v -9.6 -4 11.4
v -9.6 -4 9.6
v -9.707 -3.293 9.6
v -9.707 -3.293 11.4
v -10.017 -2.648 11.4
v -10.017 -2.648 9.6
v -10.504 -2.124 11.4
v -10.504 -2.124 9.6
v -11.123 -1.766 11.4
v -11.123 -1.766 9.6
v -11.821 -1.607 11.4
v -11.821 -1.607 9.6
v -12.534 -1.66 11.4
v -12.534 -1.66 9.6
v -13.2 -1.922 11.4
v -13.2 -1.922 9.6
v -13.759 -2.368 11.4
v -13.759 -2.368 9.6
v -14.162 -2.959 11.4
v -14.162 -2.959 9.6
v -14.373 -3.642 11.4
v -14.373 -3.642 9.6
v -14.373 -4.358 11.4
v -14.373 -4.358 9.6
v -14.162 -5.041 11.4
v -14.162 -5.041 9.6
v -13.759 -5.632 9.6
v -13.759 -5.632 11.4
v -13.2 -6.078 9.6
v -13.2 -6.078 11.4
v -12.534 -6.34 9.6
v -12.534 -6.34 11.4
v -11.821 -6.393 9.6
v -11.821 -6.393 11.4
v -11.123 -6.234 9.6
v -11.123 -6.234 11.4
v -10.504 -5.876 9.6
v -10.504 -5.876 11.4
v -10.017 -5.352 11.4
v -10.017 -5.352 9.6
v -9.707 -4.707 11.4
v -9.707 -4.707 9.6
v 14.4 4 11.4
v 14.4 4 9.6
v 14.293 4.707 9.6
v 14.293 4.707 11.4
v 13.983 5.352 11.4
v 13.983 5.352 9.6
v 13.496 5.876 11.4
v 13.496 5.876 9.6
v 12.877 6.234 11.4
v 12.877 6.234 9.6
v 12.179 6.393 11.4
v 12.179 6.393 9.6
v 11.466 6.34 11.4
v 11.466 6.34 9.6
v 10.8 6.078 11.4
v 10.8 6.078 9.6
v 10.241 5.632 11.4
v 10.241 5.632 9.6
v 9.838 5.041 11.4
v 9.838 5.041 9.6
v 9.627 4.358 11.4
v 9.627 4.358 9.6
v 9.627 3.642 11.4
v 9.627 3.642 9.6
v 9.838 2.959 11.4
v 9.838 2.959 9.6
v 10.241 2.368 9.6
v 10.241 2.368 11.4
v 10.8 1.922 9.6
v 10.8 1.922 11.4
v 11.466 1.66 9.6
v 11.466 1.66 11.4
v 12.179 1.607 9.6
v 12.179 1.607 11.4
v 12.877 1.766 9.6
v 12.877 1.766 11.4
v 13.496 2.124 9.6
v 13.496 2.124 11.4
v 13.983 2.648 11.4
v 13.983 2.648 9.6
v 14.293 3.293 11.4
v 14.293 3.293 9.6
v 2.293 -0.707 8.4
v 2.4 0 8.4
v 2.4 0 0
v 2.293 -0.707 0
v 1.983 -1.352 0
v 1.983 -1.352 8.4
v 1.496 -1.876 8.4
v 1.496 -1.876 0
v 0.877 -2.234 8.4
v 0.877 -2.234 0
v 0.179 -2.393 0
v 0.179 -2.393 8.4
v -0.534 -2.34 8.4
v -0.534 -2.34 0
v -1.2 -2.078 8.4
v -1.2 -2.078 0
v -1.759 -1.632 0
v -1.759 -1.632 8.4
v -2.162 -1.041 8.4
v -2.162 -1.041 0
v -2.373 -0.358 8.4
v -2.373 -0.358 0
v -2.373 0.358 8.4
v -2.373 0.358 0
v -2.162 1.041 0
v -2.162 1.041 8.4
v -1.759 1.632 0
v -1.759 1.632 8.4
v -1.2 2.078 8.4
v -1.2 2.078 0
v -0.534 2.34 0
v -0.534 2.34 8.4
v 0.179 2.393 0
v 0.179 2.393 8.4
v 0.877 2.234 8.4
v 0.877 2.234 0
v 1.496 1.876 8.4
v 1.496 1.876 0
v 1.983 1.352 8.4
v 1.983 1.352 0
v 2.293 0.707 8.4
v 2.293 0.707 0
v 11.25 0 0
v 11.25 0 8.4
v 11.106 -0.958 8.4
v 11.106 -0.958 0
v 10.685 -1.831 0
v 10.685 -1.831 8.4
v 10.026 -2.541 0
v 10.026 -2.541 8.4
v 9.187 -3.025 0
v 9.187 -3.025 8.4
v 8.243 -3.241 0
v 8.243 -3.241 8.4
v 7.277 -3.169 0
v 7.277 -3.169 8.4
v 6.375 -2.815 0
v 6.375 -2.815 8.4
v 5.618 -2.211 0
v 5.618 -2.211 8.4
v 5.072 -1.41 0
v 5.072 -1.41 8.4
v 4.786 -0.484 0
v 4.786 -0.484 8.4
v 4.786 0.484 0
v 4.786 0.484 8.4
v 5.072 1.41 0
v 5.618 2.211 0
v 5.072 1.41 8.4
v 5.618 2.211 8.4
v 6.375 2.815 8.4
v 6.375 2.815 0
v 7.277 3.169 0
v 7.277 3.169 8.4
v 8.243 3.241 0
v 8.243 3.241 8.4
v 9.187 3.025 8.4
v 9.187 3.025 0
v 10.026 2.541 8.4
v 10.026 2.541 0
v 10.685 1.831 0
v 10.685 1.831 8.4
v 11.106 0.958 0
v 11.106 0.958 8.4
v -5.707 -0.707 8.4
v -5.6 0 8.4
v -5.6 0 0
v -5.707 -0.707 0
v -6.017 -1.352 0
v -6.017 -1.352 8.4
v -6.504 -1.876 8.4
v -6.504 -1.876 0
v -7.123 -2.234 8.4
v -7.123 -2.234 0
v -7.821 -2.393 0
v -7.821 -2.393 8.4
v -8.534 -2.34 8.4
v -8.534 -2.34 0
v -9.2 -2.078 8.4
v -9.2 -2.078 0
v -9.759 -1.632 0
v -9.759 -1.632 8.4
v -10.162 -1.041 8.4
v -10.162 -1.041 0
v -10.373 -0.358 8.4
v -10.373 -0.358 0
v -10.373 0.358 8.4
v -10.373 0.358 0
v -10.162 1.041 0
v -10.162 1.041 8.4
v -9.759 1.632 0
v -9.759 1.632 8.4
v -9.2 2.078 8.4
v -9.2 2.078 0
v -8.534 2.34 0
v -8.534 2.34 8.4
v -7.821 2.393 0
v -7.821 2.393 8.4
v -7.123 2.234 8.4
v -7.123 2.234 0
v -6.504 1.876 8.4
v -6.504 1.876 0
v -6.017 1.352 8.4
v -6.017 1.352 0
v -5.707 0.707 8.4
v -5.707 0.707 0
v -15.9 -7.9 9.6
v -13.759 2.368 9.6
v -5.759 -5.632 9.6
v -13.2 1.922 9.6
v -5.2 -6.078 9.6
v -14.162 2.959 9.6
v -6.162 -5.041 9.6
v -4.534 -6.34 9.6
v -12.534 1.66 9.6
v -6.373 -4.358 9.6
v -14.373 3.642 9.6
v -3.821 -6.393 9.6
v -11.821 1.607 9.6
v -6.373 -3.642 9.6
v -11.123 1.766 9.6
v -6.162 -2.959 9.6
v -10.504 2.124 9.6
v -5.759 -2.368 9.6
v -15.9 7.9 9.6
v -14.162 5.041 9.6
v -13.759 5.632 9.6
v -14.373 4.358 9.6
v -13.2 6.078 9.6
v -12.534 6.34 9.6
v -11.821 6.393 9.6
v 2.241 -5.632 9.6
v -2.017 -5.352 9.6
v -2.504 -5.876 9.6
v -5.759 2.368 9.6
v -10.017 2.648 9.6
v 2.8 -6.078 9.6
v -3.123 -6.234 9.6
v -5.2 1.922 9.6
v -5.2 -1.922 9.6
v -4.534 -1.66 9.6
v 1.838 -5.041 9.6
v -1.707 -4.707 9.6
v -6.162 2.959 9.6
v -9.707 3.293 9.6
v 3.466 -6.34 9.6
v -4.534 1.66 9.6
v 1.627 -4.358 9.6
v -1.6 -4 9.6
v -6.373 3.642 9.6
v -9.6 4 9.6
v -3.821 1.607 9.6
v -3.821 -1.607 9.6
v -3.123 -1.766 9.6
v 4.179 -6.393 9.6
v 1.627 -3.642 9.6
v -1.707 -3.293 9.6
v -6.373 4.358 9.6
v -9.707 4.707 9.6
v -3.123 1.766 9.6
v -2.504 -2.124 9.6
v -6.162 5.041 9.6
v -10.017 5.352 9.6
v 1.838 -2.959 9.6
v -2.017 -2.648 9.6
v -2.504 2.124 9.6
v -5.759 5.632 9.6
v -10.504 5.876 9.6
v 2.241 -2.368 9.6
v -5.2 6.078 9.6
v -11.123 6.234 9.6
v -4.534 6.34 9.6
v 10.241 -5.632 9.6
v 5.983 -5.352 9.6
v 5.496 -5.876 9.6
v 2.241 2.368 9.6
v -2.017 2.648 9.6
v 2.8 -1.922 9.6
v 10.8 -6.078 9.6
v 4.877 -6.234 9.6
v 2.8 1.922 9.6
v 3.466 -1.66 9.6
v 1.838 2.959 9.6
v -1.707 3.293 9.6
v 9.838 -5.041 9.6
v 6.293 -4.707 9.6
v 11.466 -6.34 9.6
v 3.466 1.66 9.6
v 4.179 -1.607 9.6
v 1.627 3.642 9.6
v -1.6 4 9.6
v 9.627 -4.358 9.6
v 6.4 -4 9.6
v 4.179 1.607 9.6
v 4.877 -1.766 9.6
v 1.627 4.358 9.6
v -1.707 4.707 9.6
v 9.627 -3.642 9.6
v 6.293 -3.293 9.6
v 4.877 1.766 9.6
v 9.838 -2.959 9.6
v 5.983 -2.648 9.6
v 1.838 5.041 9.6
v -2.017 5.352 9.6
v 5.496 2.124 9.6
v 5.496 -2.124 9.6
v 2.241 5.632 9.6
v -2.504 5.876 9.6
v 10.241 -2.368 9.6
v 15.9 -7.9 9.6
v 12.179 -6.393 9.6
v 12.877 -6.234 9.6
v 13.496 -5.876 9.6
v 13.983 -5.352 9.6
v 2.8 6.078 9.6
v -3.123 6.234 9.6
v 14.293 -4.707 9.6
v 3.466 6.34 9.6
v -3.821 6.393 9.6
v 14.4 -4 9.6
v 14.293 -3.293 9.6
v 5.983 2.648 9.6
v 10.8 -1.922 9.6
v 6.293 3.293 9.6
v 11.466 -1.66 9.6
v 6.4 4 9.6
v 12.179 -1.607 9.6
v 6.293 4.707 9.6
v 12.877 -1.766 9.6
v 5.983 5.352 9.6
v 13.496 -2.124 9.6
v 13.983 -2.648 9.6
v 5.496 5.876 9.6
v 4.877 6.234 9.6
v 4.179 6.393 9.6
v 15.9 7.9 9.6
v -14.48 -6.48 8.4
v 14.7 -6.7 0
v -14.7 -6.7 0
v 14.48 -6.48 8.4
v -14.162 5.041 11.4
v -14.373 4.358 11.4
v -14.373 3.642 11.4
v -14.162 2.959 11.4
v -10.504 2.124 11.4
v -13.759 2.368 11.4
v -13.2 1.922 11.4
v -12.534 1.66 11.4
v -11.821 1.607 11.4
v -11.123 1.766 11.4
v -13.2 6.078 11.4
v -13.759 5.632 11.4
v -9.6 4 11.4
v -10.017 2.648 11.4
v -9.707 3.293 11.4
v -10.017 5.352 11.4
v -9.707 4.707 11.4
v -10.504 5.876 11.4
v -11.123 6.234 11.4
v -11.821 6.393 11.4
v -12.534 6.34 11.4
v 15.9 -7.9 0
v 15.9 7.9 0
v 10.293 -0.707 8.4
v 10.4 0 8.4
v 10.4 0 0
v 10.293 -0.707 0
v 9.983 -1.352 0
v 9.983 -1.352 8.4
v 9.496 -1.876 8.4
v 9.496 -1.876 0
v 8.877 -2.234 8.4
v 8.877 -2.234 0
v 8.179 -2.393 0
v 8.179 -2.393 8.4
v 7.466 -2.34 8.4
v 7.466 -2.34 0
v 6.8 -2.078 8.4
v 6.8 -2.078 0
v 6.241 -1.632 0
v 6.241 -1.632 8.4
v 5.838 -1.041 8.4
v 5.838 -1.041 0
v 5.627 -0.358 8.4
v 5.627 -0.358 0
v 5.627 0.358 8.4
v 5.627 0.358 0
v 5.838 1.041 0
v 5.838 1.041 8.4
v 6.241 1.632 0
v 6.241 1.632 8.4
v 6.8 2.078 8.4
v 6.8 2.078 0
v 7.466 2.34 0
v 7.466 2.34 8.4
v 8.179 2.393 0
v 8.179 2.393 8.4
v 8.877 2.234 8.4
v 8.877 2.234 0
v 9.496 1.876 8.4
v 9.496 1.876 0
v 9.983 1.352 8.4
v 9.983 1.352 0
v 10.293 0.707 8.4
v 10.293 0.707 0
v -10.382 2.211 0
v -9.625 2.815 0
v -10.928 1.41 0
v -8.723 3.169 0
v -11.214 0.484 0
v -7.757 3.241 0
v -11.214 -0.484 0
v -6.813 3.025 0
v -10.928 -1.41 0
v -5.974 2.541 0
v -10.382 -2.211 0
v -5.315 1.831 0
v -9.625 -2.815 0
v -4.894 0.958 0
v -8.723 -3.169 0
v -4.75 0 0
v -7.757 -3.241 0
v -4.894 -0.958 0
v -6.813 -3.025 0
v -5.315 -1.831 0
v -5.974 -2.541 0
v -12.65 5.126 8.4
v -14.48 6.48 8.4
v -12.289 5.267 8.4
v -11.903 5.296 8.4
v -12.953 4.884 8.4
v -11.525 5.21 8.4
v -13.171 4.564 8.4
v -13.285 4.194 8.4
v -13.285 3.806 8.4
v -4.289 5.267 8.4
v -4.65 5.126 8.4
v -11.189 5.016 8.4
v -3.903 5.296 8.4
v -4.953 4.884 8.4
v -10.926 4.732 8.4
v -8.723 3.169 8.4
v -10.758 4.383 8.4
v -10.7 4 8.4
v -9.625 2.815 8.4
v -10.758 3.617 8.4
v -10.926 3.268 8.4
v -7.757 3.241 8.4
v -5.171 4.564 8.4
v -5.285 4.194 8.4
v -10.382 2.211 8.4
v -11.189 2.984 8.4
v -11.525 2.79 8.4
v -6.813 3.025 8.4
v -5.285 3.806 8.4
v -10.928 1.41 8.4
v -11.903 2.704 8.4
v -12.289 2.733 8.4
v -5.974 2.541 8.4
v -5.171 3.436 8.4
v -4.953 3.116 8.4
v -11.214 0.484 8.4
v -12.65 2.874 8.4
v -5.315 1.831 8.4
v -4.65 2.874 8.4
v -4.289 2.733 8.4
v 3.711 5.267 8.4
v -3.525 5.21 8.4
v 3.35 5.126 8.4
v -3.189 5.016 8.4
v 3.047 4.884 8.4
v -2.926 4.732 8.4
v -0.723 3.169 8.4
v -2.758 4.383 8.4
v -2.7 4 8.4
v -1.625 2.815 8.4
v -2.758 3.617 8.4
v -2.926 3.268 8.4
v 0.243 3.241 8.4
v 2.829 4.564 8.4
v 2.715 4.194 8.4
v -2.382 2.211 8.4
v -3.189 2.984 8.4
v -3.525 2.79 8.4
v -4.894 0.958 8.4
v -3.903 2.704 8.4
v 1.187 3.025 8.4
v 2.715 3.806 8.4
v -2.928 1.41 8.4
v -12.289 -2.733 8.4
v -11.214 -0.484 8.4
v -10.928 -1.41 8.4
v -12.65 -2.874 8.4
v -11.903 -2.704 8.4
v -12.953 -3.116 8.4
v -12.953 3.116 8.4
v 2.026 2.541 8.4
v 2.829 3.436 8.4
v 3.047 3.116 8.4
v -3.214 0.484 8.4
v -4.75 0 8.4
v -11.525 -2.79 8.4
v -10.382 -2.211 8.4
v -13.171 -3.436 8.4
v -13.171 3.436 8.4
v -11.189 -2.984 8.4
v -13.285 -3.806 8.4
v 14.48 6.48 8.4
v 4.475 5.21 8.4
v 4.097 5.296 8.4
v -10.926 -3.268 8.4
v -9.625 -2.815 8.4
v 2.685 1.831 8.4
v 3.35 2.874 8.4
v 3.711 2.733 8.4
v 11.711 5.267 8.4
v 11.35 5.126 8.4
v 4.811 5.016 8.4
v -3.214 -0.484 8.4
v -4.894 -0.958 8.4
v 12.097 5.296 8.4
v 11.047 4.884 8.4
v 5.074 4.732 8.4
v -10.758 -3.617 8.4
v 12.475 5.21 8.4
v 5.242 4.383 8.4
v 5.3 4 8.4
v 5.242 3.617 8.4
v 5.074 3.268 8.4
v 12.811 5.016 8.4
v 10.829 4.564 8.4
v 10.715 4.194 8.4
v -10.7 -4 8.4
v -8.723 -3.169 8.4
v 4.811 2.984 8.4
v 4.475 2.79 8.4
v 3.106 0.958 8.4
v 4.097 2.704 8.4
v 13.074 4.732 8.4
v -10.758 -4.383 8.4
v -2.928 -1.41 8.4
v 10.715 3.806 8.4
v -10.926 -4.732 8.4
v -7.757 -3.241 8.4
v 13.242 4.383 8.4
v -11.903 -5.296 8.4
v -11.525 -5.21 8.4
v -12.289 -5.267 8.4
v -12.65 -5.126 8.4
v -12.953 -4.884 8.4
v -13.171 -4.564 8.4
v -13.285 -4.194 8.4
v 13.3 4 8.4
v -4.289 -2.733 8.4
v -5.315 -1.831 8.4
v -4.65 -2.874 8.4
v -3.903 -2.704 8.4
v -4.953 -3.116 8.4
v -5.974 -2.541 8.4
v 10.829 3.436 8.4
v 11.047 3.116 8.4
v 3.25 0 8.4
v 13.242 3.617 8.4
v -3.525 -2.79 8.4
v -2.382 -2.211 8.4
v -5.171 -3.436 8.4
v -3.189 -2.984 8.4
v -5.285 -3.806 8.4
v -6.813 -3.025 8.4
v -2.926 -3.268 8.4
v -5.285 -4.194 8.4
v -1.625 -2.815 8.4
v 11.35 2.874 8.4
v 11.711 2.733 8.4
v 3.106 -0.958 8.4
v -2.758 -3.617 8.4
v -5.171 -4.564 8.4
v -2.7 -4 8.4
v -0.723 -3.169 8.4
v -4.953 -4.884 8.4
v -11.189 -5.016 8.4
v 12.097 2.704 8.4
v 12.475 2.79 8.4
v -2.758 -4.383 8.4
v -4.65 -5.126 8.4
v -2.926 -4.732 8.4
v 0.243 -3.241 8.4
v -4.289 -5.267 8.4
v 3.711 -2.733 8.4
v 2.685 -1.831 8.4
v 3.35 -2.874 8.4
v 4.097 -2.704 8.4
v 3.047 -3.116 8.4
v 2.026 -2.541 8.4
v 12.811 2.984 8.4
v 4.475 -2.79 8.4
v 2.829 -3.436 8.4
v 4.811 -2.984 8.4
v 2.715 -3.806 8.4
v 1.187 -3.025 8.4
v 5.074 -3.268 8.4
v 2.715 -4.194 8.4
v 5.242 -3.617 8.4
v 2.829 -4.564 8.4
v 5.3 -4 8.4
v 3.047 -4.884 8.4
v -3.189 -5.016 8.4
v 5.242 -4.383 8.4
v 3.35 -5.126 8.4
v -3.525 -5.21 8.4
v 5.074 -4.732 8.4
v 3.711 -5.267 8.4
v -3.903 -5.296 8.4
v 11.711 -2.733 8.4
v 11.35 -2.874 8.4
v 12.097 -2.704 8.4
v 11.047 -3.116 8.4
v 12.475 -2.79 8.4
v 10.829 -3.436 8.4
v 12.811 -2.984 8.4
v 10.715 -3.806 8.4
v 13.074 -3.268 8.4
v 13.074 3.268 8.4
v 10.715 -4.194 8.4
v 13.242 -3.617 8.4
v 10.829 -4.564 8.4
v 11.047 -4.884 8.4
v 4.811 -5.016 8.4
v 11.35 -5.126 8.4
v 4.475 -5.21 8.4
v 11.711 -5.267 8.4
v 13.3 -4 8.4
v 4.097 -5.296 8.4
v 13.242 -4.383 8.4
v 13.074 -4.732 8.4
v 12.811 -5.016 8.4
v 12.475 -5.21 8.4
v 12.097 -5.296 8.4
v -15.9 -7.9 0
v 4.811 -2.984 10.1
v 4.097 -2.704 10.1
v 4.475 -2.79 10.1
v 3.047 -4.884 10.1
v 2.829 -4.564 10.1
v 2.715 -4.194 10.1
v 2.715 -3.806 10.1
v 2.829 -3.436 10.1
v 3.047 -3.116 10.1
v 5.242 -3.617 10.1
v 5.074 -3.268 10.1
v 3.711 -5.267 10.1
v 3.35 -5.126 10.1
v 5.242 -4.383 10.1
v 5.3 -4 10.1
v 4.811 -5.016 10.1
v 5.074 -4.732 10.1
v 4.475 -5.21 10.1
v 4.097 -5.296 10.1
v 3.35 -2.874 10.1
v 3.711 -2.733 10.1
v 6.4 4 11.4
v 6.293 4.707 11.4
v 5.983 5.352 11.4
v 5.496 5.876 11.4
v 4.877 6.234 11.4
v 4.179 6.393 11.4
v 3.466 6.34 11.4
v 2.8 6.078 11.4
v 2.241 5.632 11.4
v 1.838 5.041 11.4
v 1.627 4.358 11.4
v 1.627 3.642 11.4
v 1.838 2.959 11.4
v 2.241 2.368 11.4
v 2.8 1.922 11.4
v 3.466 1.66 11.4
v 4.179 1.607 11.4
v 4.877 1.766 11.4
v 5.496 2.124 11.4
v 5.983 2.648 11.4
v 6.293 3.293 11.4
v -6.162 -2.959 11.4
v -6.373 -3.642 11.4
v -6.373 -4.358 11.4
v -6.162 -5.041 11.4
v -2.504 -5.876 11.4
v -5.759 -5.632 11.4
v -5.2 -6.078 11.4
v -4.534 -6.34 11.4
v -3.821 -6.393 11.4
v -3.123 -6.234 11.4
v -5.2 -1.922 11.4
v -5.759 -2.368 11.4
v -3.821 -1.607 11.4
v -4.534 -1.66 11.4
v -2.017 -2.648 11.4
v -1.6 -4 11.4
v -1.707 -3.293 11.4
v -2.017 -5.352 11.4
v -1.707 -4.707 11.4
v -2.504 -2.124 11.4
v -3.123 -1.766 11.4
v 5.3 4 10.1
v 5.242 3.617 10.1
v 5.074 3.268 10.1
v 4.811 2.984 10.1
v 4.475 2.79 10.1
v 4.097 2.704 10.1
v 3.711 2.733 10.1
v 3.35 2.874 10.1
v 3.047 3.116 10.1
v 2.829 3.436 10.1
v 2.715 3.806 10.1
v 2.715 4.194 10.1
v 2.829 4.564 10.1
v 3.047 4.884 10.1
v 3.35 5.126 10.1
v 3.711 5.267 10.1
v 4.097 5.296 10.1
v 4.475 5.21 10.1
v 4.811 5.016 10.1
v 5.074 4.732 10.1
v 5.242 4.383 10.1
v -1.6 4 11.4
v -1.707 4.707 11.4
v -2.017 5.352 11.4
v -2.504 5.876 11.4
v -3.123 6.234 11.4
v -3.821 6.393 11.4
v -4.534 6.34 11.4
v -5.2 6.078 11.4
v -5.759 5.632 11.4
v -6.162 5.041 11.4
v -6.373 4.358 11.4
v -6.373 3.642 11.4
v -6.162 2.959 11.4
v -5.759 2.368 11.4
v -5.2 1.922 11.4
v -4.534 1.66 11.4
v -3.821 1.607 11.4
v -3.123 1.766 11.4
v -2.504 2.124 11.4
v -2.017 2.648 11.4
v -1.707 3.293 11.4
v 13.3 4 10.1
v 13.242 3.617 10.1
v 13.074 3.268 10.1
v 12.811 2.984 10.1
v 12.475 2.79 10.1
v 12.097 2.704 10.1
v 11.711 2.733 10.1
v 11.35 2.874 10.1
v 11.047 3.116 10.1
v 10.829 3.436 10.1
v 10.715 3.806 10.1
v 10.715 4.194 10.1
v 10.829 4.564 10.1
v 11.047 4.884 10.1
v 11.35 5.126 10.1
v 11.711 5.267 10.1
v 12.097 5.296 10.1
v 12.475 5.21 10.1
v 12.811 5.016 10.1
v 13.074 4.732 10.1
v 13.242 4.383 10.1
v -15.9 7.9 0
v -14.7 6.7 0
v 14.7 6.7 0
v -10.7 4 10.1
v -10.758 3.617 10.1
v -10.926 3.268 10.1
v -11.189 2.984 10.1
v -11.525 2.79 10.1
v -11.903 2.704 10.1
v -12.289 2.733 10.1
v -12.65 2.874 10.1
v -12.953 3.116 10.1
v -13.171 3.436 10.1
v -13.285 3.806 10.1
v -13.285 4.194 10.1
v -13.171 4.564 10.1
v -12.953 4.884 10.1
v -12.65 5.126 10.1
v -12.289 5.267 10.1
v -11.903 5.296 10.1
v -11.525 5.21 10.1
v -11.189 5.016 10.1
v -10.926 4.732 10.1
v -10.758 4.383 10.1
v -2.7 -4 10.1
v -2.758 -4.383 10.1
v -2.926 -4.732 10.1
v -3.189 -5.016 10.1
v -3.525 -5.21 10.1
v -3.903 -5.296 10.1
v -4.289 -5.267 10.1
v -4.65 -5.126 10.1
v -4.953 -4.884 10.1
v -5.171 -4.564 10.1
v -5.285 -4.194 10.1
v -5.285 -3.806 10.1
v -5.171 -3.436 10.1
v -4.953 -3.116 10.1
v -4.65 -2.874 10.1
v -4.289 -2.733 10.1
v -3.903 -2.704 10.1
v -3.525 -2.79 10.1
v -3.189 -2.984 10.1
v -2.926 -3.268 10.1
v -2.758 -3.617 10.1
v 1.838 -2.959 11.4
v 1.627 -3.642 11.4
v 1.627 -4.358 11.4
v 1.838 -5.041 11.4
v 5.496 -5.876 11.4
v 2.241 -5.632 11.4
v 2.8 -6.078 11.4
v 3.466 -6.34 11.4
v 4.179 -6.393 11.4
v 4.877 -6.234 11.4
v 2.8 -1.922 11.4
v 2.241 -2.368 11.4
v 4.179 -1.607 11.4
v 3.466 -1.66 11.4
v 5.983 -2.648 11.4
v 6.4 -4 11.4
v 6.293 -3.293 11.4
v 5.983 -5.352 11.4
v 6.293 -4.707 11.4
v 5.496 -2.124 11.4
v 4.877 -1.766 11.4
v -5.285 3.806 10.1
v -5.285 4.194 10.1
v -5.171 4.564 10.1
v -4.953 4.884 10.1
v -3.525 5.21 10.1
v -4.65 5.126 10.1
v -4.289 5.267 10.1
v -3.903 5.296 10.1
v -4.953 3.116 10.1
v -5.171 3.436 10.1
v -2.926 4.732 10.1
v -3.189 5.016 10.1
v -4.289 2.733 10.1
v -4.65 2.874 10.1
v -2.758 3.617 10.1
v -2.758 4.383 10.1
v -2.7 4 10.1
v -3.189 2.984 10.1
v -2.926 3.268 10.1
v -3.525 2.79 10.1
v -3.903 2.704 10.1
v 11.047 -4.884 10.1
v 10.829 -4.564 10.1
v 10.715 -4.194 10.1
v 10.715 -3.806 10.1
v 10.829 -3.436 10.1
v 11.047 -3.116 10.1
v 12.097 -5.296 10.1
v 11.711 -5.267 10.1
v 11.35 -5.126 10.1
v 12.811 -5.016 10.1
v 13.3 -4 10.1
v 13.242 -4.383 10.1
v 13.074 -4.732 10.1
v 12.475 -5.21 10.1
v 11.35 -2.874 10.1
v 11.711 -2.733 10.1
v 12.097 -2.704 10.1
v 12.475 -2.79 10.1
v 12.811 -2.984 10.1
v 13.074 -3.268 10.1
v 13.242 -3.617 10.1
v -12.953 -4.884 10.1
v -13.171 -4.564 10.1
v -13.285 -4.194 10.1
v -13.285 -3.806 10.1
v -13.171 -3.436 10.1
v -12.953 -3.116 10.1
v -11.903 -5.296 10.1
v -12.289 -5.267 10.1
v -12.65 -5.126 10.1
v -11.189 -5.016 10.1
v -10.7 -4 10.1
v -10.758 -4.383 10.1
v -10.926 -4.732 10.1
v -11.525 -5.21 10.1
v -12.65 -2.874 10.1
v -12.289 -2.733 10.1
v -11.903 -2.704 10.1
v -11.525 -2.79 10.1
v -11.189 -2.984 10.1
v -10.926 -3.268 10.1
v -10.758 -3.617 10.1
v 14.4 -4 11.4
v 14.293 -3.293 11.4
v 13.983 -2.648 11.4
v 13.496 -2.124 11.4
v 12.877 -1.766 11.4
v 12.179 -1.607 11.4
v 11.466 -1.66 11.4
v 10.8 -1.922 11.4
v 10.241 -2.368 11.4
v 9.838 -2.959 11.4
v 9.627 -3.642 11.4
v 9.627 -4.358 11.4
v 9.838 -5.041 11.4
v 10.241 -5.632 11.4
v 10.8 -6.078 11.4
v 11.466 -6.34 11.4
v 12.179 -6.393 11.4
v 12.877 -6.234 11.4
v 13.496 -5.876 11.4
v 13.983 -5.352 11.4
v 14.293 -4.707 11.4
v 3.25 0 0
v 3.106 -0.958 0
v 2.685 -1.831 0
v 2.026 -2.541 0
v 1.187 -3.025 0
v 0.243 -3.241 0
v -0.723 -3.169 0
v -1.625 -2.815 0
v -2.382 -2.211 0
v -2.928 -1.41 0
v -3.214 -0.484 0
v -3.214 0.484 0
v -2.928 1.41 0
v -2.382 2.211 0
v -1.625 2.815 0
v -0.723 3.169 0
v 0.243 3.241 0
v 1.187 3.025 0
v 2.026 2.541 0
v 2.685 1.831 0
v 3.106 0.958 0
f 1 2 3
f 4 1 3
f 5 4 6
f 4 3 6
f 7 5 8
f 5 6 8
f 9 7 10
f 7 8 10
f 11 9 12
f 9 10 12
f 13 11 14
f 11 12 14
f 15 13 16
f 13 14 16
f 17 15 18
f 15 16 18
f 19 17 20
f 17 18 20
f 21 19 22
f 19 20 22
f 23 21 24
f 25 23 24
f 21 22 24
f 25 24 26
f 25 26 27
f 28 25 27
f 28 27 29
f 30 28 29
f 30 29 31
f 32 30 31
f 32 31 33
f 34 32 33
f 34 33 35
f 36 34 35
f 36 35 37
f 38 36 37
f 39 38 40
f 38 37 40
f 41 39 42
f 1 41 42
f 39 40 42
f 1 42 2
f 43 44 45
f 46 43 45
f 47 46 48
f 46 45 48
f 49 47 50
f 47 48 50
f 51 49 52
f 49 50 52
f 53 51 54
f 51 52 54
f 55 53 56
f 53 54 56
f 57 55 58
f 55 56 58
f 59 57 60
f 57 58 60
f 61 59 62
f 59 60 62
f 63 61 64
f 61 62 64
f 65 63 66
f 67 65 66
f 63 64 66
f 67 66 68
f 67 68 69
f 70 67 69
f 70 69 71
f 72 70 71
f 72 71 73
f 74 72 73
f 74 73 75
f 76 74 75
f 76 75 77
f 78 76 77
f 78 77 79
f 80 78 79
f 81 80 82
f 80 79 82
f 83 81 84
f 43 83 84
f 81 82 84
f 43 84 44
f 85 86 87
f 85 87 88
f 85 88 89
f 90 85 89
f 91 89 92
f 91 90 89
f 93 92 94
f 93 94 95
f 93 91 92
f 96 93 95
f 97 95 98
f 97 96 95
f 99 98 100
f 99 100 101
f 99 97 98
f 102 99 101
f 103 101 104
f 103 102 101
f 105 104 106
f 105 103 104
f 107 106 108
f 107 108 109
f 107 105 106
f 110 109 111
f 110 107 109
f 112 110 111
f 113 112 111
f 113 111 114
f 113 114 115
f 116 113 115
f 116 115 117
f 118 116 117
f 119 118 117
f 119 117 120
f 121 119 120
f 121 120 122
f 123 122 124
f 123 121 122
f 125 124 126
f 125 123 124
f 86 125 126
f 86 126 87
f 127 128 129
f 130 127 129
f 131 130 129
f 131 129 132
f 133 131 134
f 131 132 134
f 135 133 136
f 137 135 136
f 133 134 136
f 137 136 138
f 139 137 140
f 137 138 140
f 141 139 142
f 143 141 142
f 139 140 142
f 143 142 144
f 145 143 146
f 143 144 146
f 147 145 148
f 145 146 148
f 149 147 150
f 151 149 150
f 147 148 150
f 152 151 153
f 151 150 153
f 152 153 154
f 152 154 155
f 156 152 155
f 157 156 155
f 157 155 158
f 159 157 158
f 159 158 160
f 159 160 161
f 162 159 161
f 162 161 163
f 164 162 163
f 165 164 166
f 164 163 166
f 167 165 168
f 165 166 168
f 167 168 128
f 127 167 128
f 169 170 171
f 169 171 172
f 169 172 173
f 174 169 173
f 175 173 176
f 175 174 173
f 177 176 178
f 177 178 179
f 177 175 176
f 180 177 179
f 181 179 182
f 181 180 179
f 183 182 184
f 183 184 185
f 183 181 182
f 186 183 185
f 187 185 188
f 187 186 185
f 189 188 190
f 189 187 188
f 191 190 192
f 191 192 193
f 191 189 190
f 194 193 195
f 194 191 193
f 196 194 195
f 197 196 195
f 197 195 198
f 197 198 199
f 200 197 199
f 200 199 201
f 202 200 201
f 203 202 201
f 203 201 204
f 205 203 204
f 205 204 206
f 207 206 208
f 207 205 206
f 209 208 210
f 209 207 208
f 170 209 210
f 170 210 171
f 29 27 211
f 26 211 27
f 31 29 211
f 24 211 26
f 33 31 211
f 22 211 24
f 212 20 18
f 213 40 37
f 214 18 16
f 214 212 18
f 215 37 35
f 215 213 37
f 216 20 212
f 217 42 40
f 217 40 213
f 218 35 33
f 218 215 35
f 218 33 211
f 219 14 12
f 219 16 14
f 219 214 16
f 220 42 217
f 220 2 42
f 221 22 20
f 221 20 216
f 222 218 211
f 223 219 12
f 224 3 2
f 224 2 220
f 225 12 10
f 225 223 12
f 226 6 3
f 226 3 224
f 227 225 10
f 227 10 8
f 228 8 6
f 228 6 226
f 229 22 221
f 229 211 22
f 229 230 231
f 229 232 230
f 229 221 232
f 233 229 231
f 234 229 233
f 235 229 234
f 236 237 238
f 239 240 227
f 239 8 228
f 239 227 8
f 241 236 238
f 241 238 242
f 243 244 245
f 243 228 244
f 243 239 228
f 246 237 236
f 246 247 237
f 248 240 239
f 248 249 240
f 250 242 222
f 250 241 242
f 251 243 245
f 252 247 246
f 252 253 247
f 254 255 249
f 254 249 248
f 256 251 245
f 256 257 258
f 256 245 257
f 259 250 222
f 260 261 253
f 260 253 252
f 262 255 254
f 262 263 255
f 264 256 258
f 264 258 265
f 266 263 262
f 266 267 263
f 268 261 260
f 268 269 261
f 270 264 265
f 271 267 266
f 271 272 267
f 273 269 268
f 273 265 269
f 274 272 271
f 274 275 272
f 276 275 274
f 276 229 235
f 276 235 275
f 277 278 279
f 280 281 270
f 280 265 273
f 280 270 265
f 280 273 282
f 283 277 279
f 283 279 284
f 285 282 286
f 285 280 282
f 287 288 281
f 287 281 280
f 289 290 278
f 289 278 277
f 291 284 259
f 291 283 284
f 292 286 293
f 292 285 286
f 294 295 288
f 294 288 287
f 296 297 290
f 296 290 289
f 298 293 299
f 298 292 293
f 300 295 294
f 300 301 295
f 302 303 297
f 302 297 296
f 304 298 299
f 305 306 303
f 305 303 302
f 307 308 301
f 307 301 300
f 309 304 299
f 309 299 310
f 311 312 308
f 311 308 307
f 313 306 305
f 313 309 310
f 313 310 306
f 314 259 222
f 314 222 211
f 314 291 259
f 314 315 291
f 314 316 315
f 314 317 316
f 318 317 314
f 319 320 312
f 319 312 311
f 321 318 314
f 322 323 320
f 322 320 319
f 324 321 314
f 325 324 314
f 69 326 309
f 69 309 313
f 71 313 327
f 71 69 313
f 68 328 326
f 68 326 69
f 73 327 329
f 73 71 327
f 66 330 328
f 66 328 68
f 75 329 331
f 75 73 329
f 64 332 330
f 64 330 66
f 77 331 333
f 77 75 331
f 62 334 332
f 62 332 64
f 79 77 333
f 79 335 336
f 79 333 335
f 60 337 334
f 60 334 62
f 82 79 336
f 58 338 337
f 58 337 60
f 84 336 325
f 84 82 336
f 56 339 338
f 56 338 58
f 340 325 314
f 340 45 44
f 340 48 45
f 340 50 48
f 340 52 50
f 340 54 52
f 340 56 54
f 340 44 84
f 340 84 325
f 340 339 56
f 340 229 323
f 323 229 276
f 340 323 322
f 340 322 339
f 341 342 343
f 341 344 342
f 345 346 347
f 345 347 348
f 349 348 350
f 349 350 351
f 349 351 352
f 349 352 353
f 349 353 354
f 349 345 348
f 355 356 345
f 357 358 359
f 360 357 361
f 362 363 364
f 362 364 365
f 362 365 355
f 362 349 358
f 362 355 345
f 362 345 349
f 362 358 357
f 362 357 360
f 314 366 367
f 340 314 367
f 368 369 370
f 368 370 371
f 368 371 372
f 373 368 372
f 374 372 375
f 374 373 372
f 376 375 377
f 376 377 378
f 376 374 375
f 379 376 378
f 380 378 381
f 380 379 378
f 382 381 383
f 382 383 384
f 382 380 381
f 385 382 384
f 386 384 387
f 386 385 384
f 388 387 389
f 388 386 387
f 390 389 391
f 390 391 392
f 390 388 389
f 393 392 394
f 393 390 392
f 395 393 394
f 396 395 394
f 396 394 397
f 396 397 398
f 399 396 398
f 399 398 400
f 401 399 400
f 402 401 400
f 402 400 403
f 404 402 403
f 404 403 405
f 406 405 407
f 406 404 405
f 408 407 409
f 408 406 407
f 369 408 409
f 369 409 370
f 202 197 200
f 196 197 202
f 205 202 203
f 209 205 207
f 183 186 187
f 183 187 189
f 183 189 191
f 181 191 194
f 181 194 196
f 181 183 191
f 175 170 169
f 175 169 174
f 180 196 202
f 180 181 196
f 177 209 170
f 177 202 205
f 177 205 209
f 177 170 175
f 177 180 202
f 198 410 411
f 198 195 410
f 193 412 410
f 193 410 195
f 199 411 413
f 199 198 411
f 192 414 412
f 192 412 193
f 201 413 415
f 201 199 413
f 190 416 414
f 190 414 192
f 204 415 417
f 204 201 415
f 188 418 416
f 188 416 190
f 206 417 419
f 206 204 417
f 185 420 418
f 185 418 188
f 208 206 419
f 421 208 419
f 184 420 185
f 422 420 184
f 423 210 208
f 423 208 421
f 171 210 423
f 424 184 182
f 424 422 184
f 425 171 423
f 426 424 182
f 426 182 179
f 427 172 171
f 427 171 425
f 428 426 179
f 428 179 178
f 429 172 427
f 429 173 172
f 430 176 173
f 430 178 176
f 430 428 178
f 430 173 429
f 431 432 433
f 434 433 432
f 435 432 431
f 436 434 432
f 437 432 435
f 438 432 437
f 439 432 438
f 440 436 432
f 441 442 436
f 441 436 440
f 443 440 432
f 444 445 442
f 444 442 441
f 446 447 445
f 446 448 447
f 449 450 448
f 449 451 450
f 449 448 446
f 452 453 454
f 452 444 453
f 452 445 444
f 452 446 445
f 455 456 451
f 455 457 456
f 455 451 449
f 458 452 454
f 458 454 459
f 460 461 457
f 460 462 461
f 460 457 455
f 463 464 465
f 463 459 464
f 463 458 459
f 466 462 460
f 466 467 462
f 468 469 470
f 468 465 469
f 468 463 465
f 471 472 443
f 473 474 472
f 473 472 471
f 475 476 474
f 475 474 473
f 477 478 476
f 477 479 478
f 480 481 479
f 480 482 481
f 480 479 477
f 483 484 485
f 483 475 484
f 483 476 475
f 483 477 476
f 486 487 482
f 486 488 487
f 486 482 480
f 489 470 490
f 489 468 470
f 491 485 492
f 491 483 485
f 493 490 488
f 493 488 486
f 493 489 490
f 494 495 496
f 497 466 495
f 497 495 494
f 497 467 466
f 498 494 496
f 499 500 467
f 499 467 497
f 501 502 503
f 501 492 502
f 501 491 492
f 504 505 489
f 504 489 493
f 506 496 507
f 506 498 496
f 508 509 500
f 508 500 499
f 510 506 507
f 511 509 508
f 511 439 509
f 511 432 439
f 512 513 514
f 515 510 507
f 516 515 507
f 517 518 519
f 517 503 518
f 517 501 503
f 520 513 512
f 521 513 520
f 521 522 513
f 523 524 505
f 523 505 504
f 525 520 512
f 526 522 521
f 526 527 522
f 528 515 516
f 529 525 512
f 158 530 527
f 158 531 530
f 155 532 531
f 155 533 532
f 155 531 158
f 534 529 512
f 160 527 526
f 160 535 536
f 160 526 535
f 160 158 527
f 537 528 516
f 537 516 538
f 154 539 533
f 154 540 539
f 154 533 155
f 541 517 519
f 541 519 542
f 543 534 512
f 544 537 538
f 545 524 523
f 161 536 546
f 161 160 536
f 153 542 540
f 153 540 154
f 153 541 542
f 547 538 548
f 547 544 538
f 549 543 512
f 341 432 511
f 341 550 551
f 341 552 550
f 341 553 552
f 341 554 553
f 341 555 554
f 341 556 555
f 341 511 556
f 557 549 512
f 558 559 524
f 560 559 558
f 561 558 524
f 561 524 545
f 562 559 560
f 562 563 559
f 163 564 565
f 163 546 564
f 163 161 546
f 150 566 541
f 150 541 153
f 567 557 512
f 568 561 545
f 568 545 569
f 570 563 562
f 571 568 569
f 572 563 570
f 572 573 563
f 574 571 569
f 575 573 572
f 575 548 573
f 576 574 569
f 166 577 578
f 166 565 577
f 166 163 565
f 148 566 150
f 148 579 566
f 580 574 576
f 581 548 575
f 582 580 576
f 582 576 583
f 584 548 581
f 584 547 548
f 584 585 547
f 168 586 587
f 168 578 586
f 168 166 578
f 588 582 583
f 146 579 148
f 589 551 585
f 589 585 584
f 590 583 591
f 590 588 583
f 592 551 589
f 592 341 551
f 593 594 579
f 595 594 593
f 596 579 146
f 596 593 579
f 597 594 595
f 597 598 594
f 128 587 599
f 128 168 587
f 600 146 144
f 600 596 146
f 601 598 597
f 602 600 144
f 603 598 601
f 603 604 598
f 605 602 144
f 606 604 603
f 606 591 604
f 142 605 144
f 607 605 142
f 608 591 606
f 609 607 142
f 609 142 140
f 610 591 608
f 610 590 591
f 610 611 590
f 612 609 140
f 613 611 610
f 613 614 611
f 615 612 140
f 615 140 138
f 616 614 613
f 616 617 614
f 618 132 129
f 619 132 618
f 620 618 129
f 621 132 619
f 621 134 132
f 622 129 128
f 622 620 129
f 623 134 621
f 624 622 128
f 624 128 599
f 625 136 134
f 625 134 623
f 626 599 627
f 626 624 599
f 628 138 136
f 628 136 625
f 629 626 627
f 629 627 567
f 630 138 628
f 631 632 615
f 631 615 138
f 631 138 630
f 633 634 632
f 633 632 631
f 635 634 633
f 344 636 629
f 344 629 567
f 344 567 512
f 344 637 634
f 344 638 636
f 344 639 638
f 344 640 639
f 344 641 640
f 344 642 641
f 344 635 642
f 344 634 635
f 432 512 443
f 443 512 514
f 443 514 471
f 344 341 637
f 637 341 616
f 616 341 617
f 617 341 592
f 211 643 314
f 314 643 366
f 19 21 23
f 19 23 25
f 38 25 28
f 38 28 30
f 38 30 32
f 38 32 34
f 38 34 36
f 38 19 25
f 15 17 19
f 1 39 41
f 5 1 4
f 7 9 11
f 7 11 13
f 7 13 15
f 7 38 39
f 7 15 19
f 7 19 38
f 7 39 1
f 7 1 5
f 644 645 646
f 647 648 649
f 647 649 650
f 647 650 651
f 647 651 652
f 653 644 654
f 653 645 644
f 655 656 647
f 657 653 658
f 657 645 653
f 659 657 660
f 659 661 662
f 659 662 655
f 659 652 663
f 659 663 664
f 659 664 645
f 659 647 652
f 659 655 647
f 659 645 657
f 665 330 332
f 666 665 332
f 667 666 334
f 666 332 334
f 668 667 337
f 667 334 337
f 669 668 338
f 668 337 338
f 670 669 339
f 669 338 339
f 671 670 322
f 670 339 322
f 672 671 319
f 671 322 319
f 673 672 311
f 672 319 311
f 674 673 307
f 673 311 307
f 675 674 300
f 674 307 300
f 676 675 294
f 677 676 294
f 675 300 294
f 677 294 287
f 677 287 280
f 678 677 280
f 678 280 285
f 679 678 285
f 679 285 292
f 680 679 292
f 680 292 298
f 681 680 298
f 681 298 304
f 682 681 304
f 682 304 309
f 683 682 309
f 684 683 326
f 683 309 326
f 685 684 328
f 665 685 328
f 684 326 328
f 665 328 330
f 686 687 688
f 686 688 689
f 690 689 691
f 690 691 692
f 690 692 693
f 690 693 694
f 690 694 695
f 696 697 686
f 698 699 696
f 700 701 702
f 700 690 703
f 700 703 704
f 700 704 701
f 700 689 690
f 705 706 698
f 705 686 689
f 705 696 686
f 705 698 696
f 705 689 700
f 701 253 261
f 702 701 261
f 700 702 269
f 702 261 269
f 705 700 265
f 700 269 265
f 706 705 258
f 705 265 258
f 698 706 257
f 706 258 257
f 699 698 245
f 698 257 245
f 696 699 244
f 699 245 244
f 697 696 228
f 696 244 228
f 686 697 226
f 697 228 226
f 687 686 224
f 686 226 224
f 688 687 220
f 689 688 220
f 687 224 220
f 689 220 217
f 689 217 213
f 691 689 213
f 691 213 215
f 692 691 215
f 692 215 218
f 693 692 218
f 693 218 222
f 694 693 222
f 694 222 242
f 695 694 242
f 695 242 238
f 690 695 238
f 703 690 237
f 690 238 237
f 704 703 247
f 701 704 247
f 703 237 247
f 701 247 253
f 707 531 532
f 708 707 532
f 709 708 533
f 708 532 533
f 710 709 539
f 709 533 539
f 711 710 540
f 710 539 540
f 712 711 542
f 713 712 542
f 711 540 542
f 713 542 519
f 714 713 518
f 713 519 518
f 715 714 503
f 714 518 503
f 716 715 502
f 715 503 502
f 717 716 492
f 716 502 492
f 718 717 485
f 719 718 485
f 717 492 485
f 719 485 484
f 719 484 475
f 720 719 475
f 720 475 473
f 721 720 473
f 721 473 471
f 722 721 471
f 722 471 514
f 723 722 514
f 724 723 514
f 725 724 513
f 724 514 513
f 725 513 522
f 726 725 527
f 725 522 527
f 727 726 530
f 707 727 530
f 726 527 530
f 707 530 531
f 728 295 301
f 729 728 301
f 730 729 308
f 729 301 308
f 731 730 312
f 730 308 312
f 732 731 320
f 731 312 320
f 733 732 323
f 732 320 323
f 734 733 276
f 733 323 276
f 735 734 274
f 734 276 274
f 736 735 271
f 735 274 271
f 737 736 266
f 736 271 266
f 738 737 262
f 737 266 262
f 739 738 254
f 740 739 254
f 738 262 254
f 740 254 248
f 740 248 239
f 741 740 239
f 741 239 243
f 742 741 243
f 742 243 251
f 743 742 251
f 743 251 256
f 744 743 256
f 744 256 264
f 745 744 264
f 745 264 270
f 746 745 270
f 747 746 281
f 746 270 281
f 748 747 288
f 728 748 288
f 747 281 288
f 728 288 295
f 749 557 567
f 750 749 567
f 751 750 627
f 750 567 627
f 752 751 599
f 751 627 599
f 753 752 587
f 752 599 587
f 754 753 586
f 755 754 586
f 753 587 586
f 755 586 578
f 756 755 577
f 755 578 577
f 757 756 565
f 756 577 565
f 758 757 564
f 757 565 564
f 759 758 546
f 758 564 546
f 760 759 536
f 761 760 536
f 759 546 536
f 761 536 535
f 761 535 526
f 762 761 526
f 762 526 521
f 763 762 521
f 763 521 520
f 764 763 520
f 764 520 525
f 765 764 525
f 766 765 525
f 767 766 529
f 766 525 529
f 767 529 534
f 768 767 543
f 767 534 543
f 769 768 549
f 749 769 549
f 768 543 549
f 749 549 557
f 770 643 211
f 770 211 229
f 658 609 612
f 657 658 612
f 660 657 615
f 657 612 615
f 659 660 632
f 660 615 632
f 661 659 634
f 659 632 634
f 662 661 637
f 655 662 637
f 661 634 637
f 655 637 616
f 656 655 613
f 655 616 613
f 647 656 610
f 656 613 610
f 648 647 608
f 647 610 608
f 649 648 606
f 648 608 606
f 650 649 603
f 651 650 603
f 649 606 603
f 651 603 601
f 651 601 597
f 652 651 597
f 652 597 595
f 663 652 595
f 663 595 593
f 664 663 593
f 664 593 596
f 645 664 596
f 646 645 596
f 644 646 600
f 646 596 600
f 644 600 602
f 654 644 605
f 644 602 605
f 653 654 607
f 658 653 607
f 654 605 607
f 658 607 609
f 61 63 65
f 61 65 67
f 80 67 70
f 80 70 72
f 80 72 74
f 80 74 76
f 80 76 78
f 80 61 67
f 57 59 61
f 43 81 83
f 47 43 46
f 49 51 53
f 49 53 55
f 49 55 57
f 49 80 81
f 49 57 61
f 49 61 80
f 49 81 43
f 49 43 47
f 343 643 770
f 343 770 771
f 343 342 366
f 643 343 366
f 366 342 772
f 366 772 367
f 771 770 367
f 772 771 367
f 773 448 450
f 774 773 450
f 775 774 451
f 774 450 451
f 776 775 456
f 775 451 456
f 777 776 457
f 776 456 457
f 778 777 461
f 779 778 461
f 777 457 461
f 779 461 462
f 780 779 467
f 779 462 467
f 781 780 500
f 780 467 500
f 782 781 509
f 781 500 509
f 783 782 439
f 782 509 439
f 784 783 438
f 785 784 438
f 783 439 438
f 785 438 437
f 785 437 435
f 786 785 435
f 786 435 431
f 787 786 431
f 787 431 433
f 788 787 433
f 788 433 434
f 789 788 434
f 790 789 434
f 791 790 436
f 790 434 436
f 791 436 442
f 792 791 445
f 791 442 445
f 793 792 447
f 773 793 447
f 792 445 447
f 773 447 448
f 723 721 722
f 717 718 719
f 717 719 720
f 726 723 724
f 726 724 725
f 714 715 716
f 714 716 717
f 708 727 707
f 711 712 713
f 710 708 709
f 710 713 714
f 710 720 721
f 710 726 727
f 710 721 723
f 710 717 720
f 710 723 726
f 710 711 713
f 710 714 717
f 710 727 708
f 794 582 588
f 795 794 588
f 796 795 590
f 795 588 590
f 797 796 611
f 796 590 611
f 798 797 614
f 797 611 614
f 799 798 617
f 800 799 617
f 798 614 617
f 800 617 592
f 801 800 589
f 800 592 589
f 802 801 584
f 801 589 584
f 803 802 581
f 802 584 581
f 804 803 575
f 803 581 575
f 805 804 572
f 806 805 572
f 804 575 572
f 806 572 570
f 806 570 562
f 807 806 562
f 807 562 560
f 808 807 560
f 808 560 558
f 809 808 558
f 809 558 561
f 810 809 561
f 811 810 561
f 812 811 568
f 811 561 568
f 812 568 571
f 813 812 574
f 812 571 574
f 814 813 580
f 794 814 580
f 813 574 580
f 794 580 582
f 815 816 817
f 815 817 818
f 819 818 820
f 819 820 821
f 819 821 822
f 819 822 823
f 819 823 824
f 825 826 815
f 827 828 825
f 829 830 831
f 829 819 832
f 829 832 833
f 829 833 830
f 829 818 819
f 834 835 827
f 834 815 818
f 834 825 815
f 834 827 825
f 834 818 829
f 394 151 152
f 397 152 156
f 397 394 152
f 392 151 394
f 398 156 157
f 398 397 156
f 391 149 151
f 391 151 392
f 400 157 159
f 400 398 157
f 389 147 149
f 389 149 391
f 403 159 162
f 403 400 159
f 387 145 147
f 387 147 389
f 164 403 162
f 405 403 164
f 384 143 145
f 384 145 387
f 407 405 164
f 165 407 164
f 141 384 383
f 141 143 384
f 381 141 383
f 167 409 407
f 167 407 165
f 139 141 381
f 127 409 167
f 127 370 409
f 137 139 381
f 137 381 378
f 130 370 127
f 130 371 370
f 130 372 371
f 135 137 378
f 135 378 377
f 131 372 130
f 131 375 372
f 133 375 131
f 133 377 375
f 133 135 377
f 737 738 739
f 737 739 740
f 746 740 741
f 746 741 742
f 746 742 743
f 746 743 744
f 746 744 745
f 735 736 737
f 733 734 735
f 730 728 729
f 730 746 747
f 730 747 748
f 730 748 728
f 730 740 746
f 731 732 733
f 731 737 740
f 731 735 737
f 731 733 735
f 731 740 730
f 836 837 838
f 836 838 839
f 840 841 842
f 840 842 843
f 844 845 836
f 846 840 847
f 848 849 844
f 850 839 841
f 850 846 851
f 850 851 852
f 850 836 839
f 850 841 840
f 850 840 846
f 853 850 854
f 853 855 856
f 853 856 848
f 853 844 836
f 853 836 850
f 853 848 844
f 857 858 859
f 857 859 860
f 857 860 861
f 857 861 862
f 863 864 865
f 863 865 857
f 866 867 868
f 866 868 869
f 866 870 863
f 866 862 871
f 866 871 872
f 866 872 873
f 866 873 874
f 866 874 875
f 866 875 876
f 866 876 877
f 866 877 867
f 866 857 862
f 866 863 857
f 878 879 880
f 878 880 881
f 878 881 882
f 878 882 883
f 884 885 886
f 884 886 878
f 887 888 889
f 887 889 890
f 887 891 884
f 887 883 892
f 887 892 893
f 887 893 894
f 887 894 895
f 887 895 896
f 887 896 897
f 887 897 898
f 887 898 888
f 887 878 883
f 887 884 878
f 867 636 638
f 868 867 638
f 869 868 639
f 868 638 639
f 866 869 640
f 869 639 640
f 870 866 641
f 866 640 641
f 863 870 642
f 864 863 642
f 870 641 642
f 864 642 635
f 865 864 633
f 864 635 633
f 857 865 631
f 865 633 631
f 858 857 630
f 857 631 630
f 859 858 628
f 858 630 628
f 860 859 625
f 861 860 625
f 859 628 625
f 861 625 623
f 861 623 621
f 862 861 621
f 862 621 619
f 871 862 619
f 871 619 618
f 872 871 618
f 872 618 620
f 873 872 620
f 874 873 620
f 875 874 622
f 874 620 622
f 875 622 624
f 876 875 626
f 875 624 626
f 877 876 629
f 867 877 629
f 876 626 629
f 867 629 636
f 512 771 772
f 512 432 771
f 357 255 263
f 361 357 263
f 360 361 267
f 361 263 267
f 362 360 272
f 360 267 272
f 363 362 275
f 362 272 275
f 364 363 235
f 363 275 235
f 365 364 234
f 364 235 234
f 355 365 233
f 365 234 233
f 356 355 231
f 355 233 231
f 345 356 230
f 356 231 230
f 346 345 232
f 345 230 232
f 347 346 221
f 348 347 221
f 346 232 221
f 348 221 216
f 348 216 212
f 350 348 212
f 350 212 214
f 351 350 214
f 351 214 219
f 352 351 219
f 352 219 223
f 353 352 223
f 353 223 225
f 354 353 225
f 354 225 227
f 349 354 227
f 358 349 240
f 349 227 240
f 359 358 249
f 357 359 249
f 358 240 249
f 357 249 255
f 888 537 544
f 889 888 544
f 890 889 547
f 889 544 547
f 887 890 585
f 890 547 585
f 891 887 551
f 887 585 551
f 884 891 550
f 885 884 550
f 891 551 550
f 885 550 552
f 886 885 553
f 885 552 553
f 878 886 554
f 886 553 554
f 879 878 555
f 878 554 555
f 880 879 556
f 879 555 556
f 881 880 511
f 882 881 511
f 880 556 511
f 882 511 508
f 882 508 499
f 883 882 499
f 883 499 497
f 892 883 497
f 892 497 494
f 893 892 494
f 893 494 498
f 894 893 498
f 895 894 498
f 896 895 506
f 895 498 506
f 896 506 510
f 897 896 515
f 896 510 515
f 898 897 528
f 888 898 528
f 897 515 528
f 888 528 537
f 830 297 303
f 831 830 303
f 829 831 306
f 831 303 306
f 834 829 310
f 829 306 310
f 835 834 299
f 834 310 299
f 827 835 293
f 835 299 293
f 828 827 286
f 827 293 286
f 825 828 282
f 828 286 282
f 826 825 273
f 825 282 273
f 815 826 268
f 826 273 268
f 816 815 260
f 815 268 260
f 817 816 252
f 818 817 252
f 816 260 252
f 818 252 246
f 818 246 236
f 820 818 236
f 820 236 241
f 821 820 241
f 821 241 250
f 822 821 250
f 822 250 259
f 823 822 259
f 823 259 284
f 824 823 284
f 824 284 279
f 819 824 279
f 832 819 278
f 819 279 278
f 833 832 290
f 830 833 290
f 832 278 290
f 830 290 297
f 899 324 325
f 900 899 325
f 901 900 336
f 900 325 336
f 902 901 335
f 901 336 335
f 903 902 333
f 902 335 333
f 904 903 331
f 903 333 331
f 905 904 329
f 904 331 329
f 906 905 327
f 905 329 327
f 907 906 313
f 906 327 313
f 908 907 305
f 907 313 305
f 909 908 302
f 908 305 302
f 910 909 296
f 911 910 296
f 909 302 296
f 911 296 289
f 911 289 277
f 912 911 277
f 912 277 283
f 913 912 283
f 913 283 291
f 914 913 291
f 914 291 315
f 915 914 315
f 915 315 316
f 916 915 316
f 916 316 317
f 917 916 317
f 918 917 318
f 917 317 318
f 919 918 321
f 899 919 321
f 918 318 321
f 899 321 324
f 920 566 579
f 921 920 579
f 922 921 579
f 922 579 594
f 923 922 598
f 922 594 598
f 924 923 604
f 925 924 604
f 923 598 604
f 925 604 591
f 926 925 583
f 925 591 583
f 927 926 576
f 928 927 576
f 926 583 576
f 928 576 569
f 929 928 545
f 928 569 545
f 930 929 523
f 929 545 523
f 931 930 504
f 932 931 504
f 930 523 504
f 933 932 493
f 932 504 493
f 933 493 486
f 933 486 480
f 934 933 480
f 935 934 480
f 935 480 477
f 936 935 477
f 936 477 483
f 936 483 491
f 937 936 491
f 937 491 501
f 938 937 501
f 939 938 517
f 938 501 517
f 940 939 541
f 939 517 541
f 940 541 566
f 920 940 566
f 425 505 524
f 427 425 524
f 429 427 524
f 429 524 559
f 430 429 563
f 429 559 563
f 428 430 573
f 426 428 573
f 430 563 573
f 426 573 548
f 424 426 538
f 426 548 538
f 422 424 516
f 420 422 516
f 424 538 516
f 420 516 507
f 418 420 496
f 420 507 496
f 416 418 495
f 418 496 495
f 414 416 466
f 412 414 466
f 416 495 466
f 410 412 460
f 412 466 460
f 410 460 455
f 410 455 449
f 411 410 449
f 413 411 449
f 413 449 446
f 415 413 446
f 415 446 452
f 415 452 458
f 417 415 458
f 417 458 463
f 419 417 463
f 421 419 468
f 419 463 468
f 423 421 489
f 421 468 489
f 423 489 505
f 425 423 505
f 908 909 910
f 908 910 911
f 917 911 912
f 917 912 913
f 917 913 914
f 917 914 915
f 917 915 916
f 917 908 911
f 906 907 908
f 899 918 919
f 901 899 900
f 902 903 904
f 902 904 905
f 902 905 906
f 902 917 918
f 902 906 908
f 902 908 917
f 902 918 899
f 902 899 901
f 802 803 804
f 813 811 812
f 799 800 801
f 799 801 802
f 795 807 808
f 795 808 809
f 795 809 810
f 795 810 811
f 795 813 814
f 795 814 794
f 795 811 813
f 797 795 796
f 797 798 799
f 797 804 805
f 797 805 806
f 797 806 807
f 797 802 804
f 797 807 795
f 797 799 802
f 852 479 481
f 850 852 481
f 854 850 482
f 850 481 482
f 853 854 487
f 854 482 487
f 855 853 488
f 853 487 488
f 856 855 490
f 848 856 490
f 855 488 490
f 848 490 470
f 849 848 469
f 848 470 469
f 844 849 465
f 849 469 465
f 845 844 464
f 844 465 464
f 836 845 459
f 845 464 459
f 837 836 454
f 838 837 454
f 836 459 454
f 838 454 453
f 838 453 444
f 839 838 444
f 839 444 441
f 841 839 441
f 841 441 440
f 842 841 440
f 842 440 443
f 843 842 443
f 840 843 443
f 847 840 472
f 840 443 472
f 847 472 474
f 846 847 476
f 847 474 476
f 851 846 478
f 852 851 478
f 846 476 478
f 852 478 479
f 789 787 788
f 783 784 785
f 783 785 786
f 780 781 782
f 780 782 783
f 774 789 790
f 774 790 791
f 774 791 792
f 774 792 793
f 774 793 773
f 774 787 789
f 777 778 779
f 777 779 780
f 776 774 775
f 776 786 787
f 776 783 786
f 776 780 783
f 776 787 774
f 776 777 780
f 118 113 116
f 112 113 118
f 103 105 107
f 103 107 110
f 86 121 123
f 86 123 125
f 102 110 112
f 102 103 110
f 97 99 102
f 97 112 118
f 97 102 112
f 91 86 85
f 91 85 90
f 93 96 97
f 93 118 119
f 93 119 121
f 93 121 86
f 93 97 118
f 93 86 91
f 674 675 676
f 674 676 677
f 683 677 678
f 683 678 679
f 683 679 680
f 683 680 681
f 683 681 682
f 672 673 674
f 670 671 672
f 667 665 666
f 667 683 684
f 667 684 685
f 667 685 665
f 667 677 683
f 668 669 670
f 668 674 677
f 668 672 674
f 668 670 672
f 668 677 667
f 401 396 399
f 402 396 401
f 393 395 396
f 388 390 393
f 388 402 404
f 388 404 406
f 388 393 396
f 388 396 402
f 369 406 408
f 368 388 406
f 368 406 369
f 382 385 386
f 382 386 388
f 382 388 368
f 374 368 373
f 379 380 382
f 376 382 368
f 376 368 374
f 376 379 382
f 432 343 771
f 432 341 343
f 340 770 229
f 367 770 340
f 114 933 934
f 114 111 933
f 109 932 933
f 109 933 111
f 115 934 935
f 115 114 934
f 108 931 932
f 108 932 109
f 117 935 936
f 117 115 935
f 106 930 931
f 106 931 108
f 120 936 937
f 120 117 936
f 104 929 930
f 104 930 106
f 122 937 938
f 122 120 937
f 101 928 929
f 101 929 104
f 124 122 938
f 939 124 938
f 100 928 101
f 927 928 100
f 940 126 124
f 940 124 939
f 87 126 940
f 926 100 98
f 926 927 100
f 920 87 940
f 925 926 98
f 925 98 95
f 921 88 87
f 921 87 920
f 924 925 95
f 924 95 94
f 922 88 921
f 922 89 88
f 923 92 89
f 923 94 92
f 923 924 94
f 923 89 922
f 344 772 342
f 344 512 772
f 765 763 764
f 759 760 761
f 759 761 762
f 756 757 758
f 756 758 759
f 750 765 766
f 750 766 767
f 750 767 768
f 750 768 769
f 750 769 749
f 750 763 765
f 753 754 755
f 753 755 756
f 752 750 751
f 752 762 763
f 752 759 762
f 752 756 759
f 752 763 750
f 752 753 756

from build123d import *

# Parameters (mm, degrees)
F0_W     = 31.8
F0_H     = 15.8
F1_DEPTH = 9.6
F2_R     = 2.4
F3_DEPTH = 1.8
F4_W     = 29.4
F4_H     = 13.4
F5_DEPTH = 8.4
F5_TAPER = 1.5
F6_R     = 1.3
F7_DEPTH = 1.7
F8_R     = 3.25
F8_R_2   = 2.4
F9_DEPTH = 8.4


with BuildPart() as f1:
    # F0 (on Top) → F1 (new body)
    with BuildSketch(Plane.XY):
        Rectangle(F0_W, F0_H)
    extrude(amount=F1_DEPTH)

    # F2 (on face) → F3 (join)
    with BuildSketch(Plane.XY.offset(9.6)):
        with Locations((-12, 4)):
            Circle(F2_R)
        with Locations((-12, -4)):
            Circle(F2_R)
        with Locations((-4, 4)):
            Circle(F2_R)
        with Locations((-4, -4)):
            Circle(F2_R)
        with Locations((4, 4)):
            Circle(F2_R)
        with Locations((4, -4)):
            Circle(F2_R)
        with Locations((12, 4)):
            Circle(F2_R)
        with Locations((12, -4)):
            Circle(F2_R)
    extrude(amount=F3_DEPTH)

    # F4 (on face) → F5 (cut)
    with BuildSketch(Plane(origin=(0, 0, 0), x_dir=(1, 0, 0), z_dir=(0, 0, -1))):
        Rectangle(F4_W, F4_H)
    extrude(amount=-F5_DEPTH, taper=F5_TAPER, mode=Mode.SUBTRACT)

    # F6 (on face) → F7 (cut)
    with BuildSketch(Plane(origin=(0, 0, 8.4), x_dir=(1, 0, 0), z_dir=(0, 0, -1))):
        with Locations((-12, 4)):
            Circle(F6_R)
        with Locations((-4, 4)):
            Circle(F6_R)
        with Locations((4, 4)):
            Circle(F6_R)
        with Locations((12, 4)):
            Circle(F6_R)
        with Locations((12, -4)):
            Circle(F6_R)
        with Locations((4, -4)):
            Circle(F6_R)
        with Locations((-4, -4)):
            Circle(F6_R)
        with Locations((-12, -4)):
            Circle(F6_R)
    extrude(amount=-F7_DEPTH, mode=Mode.SUBTRACT)

    # F8 (on face) → F9 (join, through all)
    with BuildSketch(Plane(origin=(0, 0, 8.4), x_dir=(1, 0, 0), z_dir=(0, 0, -1))):
        Circle(F8_R)
        Circle(F8_R_2, mode=Mode.SUBTRACT)
        with Locations((8, 0)):
            Circle(F8_R)
        with Locations((8, 0)):
            Circle(F8_R_2, mode=Mode.SUBTRACT)
        with Locations((-8, 0)):
            Circle(F8_R)
        with Locations((-8, 0)):
            Circle(F8_R_2, mode=Mode.SUBTRACT)
    extrude(amount=F9_DEPTH)


solid = f1.part
